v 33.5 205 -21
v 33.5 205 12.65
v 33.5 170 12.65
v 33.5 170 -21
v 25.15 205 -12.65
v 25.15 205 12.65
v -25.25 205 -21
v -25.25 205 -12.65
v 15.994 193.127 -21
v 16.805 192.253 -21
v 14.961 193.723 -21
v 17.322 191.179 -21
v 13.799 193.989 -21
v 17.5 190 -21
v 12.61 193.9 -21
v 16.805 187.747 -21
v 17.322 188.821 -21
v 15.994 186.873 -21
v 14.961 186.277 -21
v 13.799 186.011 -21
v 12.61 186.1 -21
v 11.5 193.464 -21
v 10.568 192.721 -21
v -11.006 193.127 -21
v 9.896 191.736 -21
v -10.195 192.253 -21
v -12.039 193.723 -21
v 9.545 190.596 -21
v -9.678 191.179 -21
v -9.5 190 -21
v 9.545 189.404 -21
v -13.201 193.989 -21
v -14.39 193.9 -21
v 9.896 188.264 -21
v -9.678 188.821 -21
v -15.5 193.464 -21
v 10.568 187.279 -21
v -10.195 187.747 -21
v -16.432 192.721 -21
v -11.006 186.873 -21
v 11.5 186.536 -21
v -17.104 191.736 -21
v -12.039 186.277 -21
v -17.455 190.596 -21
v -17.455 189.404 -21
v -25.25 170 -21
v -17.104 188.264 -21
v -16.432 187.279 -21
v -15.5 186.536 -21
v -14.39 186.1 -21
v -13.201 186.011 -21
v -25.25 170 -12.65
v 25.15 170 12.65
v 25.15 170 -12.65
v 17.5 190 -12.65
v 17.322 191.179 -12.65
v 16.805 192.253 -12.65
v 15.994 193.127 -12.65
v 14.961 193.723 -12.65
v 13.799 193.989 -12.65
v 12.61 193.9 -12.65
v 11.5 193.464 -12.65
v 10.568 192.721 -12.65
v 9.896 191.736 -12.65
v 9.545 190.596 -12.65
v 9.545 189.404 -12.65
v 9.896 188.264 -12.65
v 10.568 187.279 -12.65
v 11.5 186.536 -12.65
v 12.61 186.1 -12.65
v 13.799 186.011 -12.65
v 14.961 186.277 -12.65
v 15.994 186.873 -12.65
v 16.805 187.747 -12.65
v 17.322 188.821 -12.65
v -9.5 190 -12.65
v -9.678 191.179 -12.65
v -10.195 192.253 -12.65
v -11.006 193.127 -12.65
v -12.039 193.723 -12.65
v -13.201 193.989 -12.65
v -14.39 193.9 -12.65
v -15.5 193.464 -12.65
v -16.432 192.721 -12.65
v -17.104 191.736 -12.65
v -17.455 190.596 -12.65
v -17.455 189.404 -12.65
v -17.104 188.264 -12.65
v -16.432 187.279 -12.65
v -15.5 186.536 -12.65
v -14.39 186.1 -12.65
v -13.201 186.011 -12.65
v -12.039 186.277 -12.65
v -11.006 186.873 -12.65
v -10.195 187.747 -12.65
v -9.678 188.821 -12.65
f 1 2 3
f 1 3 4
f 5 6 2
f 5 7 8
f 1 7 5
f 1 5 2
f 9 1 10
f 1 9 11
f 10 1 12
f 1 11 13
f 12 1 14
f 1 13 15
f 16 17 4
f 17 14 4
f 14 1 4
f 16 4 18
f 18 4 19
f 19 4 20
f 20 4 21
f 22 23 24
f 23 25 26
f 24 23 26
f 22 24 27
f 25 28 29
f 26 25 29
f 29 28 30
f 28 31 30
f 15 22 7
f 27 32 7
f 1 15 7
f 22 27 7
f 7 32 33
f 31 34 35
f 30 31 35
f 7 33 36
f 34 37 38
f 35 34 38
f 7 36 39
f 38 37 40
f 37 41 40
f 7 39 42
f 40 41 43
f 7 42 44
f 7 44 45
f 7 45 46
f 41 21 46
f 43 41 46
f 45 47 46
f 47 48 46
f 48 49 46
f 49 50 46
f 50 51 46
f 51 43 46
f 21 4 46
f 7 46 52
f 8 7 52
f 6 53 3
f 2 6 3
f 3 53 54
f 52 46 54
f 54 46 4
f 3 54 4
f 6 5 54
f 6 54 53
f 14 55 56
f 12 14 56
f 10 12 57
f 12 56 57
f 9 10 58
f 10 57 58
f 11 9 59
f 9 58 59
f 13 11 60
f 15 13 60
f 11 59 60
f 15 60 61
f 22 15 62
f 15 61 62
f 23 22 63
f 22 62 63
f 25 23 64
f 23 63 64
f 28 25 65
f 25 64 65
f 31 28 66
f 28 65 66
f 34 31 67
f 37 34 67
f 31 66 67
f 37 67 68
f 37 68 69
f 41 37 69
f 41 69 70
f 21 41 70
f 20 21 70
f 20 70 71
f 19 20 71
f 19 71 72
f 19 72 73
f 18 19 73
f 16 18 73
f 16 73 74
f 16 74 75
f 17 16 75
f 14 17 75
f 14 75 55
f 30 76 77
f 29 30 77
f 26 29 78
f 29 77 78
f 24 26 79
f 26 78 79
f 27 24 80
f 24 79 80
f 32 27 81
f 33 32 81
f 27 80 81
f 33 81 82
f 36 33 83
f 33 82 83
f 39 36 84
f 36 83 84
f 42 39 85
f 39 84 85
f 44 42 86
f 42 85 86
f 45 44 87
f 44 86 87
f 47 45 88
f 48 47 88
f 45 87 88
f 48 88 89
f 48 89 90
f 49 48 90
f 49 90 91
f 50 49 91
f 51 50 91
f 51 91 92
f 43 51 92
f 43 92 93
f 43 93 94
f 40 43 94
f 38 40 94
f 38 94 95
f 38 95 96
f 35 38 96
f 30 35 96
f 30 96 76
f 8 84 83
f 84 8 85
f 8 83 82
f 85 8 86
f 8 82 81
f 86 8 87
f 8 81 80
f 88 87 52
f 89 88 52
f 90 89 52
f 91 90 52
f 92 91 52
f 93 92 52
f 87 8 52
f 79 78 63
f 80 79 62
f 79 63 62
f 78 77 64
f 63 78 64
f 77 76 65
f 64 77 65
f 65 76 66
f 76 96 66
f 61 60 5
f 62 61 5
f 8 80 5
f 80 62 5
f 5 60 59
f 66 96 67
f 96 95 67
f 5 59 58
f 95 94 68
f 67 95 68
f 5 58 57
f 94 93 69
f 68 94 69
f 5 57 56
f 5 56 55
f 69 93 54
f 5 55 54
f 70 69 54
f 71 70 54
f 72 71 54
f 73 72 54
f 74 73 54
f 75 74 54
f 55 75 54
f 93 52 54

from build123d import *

# Parameters (mm, degrees)
AUFSATZ_LINEAR_START            = 170
AUFSATZ_LINEAR_AUSTRAGEN1_DEPTH = 35
SKIZZE6_R                       = 4
SCHNITT_LINEAR_AUSTRAGEN1_DEPTH = 21


with BuildPart() as part:
    # Skizze4 → Aufsatz-Linear austragen1 (new body)
    with BuildSketch(Plane(origin=(0, 0, 0), x_dir=(1, 0, 0), z_dir=(0, 1, 0)).offset(AUFSATZ_LINEAR_START)):
        Polygon((25.15, -12.65), (33.5, -12.65), (33.5, 21), (-25.25, 21), (-25.25, 12.65), (25.15, 12.65), align=None)
    extrude(amount=AUFSATZ_LINEAR_AUSTRAGEN1_DEPTH)

    # Skizze6 → Schnitt-Linear austragen1 (cut)
    with BuildSketch(Plane.XY):
        with Locations((-13.5, 190)):
            Circle(SKIZZE6_R)
        with Locations((13.5, 190)):
            Circle(SKIZZE6_R)
    extrude(amount=-SCHNITT_LINEAR_AUSTRAGEN1_DEPTH, mode=Mode.SUBTRACT)


solid = part.part
